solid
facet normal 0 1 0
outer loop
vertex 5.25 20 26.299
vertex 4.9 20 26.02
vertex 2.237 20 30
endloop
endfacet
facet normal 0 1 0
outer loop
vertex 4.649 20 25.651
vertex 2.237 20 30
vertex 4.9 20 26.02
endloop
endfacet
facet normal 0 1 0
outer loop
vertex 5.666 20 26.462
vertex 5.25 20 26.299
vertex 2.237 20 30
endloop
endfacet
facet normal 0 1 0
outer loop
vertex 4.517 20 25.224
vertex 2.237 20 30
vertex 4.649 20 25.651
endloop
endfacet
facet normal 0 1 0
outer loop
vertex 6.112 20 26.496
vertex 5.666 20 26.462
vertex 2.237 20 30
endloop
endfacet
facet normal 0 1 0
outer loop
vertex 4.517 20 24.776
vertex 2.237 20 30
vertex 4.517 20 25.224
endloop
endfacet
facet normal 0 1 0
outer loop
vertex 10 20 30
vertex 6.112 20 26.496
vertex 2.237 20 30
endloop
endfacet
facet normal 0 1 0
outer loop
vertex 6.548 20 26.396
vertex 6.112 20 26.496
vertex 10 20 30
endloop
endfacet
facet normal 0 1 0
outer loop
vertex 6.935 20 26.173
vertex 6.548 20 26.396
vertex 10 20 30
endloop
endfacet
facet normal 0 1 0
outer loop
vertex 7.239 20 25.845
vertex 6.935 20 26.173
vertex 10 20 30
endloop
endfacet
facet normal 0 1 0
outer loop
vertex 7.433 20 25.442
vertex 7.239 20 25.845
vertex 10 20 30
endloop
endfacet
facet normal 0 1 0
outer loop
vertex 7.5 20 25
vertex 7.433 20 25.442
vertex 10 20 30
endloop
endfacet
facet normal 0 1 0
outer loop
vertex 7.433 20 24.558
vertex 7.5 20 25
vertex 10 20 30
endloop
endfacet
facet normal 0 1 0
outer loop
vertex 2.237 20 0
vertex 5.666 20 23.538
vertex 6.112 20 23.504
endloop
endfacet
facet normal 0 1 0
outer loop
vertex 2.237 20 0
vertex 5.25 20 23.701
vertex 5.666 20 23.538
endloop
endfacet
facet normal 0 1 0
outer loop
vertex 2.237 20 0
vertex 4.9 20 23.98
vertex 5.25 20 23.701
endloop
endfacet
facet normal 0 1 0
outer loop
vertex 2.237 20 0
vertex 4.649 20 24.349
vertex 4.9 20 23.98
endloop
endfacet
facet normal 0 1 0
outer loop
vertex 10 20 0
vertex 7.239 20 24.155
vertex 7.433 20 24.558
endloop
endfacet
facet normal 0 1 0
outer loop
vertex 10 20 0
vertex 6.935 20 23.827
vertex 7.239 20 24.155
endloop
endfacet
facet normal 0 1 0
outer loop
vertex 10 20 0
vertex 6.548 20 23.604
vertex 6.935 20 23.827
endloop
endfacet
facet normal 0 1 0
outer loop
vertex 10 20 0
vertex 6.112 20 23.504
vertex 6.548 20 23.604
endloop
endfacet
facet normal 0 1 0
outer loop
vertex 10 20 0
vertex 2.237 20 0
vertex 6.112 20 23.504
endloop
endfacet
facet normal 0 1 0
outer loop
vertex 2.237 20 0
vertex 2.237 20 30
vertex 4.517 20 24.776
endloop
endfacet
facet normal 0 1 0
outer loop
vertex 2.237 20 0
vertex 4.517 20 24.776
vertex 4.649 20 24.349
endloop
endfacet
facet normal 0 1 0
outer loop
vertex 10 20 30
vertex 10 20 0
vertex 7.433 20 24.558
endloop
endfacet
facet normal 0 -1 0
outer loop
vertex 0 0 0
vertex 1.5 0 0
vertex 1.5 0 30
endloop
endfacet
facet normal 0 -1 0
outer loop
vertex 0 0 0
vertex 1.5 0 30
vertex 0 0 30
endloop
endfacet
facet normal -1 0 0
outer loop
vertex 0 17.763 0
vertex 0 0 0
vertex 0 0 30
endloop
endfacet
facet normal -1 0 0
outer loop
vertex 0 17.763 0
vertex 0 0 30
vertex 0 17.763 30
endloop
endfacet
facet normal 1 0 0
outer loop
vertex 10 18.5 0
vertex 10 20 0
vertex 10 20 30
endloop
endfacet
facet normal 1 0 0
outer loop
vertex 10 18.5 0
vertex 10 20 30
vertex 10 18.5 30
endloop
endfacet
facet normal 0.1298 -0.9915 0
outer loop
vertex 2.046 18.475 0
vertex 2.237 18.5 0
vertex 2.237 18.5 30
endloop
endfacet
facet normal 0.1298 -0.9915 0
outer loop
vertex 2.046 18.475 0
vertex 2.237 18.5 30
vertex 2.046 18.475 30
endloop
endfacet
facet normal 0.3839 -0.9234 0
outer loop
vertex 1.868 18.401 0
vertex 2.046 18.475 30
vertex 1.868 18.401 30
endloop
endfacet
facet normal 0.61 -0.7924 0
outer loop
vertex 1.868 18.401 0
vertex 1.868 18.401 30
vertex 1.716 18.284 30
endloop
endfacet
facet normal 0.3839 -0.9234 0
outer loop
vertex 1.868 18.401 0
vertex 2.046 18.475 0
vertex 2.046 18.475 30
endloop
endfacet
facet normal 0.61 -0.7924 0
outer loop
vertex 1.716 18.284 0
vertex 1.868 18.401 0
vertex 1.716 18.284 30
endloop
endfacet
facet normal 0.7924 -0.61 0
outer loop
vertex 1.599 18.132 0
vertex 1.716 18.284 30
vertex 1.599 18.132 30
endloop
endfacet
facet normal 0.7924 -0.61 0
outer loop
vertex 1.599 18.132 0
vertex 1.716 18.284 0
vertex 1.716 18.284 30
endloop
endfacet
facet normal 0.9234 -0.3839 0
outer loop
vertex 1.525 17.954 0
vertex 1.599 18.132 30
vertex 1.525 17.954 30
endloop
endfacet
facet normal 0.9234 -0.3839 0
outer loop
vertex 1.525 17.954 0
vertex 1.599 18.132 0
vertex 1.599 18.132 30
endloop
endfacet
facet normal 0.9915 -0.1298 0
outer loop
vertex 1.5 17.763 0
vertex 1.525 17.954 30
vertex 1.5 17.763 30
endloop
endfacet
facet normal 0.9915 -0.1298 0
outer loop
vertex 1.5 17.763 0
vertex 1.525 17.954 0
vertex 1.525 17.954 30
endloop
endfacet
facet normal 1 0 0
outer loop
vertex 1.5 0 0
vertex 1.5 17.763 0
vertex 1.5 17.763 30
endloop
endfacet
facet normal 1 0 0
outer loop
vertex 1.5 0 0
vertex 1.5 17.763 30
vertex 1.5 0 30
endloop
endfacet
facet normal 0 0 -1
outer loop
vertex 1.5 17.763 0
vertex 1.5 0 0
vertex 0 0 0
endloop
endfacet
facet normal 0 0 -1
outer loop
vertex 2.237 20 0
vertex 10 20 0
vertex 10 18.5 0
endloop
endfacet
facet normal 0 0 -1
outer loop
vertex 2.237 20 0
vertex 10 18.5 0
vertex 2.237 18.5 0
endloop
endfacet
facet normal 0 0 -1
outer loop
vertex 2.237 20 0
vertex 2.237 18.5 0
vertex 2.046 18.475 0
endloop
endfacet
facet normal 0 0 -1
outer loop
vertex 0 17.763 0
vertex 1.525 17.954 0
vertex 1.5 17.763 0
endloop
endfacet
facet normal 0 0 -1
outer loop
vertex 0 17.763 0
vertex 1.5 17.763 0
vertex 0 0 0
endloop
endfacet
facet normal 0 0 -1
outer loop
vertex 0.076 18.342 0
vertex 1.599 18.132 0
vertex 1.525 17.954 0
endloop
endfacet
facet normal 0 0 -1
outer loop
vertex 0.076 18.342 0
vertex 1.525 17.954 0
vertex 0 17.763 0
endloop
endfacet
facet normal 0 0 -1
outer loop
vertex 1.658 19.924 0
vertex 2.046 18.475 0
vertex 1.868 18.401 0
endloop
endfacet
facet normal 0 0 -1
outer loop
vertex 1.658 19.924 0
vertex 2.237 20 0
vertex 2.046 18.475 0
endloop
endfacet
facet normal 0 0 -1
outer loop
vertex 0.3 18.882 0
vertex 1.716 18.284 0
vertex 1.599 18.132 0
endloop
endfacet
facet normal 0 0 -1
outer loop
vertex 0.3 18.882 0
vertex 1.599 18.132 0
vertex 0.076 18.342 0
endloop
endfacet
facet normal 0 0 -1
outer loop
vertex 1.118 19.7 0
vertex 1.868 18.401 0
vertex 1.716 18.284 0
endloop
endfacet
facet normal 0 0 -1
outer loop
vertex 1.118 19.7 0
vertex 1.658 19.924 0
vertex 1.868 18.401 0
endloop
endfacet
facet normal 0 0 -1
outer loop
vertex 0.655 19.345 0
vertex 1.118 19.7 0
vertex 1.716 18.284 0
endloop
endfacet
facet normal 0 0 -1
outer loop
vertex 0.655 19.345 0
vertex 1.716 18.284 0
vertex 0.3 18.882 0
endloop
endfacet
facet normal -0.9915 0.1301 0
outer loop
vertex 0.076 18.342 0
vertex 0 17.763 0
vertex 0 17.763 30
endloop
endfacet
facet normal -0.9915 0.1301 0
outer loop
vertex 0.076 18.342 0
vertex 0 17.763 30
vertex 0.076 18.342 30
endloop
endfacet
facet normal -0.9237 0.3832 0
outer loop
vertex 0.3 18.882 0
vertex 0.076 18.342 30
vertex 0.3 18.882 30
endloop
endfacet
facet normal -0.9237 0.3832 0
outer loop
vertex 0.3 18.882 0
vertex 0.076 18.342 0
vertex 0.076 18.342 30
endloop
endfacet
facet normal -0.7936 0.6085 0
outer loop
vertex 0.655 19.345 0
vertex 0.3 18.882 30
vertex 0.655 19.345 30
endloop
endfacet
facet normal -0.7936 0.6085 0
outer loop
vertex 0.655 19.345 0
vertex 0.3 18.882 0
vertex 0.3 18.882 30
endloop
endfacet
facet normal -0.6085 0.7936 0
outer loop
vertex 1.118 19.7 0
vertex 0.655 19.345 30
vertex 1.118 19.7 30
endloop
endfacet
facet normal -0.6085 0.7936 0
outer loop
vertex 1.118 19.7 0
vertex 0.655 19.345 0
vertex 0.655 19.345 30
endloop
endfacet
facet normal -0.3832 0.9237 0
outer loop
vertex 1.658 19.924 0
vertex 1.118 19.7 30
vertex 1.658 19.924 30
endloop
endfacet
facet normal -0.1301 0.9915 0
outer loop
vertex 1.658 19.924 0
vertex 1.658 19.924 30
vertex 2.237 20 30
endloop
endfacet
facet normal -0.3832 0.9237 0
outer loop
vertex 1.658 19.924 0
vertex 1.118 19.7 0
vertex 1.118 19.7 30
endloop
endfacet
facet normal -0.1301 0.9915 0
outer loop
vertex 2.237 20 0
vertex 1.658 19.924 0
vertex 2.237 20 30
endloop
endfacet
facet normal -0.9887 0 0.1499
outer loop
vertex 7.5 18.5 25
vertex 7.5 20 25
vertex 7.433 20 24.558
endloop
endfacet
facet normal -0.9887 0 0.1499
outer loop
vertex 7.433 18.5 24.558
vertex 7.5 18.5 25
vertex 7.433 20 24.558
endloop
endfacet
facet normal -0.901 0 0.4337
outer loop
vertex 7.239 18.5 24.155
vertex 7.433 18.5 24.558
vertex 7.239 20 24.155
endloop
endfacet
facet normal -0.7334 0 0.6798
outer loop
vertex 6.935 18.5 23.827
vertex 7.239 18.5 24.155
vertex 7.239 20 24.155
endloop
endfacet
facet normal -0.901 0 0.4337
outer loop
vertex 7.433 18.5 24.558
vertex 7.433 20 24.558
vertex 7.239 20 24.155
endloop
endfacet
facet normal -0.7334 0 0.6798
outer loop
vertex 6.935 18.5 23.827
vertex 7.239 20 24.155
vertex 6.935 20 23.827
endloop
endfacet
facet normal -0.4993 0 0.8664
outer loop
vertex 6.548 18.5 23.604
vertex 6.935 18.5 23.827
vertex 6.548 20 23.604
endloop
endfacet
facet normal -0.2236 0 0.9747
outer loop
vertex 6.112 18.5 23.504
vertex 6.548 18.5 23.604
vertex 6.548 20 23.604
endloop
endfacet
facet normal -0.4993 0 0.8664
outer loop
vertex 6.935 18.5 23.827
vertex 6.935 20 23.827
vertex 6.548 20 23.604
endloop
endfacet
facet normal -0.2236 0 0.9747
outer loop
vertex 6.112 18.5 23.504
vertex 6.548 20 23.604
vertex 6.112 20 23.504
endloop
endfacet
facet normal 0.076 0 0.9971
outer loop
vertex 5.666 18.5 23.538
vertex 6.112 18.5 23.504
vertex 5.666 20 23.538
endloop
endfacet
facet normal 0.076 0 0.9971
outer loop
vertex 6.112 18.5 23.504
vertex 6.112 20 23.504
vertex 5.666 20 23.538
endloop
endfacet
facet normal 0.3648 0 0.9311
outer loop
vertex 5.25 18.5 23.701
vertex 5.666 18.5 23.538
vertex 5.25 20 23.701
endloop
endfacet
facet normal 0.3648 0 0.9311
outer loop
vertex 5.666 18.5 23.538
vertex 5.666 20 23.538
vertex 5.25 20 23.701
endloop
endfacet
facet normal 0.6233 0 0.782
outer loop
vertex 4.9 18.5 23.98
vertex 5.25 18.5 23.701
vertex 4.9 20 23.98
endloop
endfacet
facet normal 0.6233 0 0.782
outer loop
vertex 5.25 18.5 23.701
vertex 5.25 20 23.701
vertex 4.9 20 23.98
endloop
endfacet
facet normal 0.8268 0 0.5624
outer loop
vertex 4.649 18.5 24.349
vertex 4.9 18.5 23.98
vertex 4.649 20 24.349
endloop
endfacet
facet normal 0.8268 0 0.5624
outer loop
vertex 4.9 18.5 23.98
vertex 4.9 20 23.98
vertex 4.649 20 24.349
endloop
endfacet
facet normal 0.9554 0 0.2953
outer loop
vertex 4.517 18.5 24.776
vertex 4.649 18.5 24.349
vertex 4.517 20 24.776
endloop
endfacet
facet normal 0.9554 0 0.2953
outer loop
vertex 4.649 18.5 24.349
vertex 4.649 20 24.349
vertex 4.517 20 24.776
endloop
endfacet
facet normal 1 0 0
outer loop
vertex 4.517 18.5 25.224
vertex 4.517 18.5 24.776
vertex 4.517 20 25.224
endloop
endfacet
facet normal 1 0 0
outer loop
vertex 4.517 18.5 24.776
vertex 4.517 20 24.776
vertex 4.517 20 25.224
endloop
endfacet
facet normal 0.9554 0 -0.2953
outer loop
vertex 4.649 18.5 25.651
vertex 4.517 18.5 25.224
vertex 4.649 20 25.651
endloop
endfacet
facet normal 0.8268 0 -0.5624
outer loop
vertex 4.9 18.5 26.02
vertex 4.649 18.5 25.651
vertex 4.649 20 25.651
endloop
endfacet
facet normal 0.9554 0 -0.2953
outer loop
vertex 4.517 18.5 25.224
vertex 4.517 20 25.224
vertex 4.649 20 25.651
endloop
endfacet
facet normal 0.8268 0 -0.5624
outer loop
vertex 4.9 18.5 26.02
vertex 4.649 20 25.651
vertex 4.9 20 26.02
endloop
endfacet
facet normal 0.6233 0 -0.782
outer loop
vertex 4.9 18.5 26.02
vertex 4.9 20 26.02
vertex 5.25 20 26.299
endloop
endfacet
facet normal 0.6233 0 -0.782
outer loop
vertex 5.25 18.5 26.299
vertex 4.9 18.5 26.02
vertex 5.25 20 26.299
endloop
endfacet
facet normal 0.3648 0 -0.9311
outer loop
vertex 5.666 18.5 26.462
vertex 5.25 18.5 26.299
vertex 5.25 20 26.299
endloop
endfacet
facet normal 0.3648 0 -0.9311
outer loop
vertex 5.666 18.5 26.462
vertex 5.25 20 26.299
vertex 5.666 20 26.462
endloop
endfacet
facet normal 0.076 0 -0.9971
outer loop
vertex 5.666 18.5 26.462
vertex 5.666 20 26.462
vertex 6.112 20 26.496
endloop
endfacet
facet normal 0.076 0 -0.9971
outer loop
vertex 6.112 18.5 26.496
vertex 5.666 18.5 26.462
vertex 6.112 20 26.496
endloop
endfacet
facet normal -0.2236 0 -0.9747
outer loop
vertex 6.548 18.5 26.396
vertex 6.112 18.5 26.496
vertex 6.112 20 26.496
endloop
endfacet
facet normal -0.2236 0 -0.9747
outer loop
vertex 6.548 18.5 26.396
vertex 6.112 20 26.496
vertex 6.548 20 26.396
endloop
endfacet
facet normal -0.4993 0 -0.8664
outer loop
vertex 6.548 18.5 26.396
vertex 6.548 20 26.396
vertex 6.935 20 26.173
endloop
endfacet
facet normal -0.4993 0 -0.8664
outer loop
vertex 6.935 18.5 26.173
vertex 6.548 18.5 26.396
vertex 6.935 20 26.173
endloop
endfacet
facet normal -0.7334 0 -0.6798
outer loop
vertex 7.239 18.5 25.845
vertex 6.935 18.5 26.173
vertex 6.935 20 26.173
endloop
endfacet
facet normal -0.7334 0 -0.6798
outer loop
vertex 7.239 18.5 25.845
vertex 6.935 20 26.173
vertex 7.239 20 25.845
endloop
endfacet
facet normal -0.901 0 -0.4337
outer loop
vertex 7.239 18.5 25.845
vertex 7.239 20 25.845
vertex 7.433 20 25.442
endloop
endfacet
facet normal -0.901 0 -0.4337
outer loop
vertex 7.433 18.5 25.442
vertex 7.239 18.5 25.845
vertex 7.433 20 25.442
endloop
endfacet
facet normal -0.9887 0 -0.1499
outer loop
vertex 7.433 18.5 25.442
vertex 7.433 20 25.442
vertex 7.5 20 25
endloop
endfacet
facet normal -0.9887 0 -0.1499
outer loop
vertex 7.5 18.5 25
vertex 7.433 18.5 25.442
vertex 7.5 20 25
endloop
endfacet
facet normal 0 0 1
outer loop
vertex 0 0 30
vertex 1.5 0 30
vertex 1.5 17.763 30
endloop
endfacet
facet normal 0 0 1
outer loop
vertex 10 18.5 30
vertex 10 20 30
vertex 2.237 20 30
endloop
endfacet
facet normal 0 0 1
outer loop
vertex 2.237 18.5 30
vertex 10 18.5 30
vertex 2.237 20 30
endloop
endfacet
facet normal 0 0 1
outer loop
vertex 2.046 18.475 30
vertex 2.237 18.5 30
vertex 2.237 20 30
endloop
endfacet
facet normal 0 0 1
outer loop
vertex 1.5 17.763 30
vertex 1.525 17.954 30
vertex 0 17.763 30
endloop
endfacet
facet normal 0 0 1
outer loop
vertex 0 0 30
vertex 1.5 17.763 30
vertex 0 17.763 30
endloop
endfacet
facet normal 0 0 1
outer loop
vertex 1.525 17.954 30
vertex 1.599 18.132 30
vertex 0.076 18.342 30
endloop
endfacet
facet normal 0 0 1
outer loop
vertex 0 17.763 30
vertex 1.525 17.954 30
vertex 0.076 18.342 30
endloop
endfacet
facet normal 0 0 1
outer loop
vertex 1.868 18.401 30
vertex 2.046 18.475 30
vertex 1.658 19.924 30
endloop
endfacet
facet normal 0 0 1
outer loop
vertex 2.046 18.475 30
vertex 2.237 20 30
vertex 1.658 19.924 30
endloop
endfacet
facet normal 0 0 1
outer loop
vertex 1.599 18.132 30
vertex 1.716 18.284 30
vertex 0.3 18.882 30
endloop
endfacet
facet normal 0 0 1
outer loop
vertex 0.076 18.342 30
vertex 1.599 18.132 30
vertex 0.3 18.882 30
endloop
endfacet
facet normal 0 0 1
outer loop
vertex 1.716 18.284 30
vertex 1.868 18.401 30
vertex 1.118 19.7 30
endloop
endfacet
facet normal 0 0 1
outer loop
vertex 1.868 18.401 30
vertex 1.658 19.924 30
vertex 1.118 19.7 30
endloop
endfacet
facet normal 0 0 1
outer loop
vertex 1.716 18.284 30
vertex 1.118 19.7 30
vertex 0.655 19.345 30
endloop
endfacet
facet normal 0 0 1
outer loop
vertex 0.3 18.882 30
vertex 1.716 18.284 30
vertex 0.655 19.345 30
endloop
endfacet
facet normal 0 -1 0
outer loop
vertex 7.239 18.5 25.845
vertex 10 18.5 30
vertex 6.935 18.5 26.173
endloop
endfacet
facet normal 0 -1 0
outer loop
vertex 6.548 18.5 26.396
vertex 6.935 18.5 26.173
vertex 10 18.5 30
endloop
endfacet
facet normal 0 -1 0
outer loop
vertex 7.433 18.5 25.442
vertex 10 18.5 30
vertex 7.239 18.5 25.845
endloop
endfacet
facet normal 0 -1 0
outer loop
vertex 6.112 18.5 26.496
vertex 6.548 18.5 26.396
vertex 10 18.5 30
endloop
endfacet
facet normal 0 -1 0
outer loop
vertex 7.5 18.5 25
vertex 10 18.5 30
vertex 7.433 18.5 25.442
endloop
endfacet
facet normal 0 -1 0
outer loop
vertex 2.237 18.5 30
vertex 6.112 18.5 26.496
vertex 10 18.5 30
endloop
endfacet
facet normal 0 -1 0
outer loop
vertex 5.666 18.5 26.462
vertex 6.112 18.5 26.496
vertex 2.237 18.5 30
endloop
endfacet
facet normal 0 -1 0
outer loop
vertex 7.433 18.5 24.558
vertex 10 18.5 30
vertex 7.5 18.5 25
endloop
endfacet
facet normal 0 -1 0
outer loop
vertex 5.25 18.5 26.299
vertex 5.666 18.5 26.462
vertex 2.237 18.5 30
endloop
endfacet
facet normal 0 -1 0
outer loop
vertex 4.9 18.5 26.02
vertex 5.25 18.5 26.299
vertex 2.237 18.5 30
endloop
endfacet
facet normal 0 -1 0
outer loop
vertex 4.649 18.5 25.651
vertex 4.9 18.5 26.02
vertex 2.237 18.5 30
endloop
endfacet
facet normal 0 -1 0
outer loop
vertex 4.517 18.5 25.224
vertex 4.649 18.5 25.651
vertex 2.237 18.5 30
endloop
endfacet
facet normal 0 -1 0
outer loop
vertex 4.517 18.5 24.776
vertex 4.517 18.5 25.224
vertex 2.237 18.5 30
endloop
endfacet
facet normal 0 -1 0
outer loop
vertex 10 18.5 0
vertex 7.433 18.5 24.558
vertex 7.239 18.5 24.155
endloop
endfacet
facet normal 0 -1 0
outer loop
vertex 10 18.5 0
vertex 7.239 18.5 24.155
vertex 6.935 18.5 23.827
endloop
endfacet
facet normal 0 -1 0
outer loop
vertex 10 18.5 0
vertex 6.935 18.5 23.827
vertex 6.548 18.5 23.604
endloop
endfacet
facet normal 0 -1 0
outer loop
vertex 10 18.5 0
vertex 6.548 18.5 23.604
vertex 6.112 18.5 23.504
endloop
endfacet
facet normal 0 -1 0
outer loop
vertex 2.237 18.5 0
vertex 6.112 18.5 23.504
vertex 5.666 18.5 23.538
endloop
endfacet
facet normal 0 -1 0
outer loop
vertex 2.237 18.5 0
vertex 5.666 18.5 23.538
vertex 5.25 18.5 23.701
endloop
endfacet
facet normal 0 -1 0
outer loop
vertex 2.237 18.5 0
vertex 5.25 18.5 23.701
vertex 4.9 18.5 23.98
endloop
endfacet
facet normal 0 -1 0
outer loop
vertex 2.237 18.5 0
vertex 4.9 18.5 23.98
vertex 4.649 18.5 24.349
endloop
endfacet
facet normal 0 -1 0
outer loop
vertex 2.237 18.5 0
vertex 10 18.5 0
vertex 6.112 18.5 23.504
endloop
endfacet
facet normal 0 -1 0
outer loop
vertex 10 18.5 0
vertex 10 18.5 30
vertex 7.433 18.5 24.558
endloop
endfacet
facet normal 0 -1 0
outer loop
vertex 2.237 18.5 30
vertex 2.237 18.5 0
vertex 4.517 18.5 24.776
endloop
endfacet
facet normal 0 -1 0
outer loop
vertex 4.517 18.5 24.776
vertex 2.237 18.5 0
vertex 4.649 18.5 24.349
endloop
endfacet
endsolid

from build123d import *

# Parameters (mm, degrees)
BASE_FLANGE1_DEPTH    = 30
F_3_0MM_DOWEL_HOLE1_D = 3


# Sheet-metal steps are written as plain solids
with BuildPart() as part:
    # Sketch1 → Base-Flange1 (new body)
    with BuildSketch(Plane.XY):
        with BuildLine():
            Line((0, 0), (0, 17.7634))
            ThreePointArc((0, 17.7634), (0.655084973, 19.344915027), (2.2366, 20))
            Line((2.2366, 20), (10, 20))
            Line((10, 20), (10, 18.5))
            Line((10, 18.5), (2.2366, 18.5))
            ThreePointArc((2.2366, 18.5), (1.715745145, 18.284254855), (1.5, 17.7634))
            Line((1.5, 17.7634), (1.5, 0))
            Line((1.5, 0), (0, 0))
        make_face()
    extrude(amount=BASE_FLANGE1_DEPTH)

    # Ø3.0mm Dowel Hole1 (through all)
    with Locations(Plane(origin=(5.118724392, 18.5, 37.745569698), x_dir=(-1, 0, 0), z_dir=(0, -1, 0))):
        with Locations((-0.881275608, 12.745569698)):
            Hole(F_3_0MM_DOWEL_HOLE1_D / 2)


solid = part.part
